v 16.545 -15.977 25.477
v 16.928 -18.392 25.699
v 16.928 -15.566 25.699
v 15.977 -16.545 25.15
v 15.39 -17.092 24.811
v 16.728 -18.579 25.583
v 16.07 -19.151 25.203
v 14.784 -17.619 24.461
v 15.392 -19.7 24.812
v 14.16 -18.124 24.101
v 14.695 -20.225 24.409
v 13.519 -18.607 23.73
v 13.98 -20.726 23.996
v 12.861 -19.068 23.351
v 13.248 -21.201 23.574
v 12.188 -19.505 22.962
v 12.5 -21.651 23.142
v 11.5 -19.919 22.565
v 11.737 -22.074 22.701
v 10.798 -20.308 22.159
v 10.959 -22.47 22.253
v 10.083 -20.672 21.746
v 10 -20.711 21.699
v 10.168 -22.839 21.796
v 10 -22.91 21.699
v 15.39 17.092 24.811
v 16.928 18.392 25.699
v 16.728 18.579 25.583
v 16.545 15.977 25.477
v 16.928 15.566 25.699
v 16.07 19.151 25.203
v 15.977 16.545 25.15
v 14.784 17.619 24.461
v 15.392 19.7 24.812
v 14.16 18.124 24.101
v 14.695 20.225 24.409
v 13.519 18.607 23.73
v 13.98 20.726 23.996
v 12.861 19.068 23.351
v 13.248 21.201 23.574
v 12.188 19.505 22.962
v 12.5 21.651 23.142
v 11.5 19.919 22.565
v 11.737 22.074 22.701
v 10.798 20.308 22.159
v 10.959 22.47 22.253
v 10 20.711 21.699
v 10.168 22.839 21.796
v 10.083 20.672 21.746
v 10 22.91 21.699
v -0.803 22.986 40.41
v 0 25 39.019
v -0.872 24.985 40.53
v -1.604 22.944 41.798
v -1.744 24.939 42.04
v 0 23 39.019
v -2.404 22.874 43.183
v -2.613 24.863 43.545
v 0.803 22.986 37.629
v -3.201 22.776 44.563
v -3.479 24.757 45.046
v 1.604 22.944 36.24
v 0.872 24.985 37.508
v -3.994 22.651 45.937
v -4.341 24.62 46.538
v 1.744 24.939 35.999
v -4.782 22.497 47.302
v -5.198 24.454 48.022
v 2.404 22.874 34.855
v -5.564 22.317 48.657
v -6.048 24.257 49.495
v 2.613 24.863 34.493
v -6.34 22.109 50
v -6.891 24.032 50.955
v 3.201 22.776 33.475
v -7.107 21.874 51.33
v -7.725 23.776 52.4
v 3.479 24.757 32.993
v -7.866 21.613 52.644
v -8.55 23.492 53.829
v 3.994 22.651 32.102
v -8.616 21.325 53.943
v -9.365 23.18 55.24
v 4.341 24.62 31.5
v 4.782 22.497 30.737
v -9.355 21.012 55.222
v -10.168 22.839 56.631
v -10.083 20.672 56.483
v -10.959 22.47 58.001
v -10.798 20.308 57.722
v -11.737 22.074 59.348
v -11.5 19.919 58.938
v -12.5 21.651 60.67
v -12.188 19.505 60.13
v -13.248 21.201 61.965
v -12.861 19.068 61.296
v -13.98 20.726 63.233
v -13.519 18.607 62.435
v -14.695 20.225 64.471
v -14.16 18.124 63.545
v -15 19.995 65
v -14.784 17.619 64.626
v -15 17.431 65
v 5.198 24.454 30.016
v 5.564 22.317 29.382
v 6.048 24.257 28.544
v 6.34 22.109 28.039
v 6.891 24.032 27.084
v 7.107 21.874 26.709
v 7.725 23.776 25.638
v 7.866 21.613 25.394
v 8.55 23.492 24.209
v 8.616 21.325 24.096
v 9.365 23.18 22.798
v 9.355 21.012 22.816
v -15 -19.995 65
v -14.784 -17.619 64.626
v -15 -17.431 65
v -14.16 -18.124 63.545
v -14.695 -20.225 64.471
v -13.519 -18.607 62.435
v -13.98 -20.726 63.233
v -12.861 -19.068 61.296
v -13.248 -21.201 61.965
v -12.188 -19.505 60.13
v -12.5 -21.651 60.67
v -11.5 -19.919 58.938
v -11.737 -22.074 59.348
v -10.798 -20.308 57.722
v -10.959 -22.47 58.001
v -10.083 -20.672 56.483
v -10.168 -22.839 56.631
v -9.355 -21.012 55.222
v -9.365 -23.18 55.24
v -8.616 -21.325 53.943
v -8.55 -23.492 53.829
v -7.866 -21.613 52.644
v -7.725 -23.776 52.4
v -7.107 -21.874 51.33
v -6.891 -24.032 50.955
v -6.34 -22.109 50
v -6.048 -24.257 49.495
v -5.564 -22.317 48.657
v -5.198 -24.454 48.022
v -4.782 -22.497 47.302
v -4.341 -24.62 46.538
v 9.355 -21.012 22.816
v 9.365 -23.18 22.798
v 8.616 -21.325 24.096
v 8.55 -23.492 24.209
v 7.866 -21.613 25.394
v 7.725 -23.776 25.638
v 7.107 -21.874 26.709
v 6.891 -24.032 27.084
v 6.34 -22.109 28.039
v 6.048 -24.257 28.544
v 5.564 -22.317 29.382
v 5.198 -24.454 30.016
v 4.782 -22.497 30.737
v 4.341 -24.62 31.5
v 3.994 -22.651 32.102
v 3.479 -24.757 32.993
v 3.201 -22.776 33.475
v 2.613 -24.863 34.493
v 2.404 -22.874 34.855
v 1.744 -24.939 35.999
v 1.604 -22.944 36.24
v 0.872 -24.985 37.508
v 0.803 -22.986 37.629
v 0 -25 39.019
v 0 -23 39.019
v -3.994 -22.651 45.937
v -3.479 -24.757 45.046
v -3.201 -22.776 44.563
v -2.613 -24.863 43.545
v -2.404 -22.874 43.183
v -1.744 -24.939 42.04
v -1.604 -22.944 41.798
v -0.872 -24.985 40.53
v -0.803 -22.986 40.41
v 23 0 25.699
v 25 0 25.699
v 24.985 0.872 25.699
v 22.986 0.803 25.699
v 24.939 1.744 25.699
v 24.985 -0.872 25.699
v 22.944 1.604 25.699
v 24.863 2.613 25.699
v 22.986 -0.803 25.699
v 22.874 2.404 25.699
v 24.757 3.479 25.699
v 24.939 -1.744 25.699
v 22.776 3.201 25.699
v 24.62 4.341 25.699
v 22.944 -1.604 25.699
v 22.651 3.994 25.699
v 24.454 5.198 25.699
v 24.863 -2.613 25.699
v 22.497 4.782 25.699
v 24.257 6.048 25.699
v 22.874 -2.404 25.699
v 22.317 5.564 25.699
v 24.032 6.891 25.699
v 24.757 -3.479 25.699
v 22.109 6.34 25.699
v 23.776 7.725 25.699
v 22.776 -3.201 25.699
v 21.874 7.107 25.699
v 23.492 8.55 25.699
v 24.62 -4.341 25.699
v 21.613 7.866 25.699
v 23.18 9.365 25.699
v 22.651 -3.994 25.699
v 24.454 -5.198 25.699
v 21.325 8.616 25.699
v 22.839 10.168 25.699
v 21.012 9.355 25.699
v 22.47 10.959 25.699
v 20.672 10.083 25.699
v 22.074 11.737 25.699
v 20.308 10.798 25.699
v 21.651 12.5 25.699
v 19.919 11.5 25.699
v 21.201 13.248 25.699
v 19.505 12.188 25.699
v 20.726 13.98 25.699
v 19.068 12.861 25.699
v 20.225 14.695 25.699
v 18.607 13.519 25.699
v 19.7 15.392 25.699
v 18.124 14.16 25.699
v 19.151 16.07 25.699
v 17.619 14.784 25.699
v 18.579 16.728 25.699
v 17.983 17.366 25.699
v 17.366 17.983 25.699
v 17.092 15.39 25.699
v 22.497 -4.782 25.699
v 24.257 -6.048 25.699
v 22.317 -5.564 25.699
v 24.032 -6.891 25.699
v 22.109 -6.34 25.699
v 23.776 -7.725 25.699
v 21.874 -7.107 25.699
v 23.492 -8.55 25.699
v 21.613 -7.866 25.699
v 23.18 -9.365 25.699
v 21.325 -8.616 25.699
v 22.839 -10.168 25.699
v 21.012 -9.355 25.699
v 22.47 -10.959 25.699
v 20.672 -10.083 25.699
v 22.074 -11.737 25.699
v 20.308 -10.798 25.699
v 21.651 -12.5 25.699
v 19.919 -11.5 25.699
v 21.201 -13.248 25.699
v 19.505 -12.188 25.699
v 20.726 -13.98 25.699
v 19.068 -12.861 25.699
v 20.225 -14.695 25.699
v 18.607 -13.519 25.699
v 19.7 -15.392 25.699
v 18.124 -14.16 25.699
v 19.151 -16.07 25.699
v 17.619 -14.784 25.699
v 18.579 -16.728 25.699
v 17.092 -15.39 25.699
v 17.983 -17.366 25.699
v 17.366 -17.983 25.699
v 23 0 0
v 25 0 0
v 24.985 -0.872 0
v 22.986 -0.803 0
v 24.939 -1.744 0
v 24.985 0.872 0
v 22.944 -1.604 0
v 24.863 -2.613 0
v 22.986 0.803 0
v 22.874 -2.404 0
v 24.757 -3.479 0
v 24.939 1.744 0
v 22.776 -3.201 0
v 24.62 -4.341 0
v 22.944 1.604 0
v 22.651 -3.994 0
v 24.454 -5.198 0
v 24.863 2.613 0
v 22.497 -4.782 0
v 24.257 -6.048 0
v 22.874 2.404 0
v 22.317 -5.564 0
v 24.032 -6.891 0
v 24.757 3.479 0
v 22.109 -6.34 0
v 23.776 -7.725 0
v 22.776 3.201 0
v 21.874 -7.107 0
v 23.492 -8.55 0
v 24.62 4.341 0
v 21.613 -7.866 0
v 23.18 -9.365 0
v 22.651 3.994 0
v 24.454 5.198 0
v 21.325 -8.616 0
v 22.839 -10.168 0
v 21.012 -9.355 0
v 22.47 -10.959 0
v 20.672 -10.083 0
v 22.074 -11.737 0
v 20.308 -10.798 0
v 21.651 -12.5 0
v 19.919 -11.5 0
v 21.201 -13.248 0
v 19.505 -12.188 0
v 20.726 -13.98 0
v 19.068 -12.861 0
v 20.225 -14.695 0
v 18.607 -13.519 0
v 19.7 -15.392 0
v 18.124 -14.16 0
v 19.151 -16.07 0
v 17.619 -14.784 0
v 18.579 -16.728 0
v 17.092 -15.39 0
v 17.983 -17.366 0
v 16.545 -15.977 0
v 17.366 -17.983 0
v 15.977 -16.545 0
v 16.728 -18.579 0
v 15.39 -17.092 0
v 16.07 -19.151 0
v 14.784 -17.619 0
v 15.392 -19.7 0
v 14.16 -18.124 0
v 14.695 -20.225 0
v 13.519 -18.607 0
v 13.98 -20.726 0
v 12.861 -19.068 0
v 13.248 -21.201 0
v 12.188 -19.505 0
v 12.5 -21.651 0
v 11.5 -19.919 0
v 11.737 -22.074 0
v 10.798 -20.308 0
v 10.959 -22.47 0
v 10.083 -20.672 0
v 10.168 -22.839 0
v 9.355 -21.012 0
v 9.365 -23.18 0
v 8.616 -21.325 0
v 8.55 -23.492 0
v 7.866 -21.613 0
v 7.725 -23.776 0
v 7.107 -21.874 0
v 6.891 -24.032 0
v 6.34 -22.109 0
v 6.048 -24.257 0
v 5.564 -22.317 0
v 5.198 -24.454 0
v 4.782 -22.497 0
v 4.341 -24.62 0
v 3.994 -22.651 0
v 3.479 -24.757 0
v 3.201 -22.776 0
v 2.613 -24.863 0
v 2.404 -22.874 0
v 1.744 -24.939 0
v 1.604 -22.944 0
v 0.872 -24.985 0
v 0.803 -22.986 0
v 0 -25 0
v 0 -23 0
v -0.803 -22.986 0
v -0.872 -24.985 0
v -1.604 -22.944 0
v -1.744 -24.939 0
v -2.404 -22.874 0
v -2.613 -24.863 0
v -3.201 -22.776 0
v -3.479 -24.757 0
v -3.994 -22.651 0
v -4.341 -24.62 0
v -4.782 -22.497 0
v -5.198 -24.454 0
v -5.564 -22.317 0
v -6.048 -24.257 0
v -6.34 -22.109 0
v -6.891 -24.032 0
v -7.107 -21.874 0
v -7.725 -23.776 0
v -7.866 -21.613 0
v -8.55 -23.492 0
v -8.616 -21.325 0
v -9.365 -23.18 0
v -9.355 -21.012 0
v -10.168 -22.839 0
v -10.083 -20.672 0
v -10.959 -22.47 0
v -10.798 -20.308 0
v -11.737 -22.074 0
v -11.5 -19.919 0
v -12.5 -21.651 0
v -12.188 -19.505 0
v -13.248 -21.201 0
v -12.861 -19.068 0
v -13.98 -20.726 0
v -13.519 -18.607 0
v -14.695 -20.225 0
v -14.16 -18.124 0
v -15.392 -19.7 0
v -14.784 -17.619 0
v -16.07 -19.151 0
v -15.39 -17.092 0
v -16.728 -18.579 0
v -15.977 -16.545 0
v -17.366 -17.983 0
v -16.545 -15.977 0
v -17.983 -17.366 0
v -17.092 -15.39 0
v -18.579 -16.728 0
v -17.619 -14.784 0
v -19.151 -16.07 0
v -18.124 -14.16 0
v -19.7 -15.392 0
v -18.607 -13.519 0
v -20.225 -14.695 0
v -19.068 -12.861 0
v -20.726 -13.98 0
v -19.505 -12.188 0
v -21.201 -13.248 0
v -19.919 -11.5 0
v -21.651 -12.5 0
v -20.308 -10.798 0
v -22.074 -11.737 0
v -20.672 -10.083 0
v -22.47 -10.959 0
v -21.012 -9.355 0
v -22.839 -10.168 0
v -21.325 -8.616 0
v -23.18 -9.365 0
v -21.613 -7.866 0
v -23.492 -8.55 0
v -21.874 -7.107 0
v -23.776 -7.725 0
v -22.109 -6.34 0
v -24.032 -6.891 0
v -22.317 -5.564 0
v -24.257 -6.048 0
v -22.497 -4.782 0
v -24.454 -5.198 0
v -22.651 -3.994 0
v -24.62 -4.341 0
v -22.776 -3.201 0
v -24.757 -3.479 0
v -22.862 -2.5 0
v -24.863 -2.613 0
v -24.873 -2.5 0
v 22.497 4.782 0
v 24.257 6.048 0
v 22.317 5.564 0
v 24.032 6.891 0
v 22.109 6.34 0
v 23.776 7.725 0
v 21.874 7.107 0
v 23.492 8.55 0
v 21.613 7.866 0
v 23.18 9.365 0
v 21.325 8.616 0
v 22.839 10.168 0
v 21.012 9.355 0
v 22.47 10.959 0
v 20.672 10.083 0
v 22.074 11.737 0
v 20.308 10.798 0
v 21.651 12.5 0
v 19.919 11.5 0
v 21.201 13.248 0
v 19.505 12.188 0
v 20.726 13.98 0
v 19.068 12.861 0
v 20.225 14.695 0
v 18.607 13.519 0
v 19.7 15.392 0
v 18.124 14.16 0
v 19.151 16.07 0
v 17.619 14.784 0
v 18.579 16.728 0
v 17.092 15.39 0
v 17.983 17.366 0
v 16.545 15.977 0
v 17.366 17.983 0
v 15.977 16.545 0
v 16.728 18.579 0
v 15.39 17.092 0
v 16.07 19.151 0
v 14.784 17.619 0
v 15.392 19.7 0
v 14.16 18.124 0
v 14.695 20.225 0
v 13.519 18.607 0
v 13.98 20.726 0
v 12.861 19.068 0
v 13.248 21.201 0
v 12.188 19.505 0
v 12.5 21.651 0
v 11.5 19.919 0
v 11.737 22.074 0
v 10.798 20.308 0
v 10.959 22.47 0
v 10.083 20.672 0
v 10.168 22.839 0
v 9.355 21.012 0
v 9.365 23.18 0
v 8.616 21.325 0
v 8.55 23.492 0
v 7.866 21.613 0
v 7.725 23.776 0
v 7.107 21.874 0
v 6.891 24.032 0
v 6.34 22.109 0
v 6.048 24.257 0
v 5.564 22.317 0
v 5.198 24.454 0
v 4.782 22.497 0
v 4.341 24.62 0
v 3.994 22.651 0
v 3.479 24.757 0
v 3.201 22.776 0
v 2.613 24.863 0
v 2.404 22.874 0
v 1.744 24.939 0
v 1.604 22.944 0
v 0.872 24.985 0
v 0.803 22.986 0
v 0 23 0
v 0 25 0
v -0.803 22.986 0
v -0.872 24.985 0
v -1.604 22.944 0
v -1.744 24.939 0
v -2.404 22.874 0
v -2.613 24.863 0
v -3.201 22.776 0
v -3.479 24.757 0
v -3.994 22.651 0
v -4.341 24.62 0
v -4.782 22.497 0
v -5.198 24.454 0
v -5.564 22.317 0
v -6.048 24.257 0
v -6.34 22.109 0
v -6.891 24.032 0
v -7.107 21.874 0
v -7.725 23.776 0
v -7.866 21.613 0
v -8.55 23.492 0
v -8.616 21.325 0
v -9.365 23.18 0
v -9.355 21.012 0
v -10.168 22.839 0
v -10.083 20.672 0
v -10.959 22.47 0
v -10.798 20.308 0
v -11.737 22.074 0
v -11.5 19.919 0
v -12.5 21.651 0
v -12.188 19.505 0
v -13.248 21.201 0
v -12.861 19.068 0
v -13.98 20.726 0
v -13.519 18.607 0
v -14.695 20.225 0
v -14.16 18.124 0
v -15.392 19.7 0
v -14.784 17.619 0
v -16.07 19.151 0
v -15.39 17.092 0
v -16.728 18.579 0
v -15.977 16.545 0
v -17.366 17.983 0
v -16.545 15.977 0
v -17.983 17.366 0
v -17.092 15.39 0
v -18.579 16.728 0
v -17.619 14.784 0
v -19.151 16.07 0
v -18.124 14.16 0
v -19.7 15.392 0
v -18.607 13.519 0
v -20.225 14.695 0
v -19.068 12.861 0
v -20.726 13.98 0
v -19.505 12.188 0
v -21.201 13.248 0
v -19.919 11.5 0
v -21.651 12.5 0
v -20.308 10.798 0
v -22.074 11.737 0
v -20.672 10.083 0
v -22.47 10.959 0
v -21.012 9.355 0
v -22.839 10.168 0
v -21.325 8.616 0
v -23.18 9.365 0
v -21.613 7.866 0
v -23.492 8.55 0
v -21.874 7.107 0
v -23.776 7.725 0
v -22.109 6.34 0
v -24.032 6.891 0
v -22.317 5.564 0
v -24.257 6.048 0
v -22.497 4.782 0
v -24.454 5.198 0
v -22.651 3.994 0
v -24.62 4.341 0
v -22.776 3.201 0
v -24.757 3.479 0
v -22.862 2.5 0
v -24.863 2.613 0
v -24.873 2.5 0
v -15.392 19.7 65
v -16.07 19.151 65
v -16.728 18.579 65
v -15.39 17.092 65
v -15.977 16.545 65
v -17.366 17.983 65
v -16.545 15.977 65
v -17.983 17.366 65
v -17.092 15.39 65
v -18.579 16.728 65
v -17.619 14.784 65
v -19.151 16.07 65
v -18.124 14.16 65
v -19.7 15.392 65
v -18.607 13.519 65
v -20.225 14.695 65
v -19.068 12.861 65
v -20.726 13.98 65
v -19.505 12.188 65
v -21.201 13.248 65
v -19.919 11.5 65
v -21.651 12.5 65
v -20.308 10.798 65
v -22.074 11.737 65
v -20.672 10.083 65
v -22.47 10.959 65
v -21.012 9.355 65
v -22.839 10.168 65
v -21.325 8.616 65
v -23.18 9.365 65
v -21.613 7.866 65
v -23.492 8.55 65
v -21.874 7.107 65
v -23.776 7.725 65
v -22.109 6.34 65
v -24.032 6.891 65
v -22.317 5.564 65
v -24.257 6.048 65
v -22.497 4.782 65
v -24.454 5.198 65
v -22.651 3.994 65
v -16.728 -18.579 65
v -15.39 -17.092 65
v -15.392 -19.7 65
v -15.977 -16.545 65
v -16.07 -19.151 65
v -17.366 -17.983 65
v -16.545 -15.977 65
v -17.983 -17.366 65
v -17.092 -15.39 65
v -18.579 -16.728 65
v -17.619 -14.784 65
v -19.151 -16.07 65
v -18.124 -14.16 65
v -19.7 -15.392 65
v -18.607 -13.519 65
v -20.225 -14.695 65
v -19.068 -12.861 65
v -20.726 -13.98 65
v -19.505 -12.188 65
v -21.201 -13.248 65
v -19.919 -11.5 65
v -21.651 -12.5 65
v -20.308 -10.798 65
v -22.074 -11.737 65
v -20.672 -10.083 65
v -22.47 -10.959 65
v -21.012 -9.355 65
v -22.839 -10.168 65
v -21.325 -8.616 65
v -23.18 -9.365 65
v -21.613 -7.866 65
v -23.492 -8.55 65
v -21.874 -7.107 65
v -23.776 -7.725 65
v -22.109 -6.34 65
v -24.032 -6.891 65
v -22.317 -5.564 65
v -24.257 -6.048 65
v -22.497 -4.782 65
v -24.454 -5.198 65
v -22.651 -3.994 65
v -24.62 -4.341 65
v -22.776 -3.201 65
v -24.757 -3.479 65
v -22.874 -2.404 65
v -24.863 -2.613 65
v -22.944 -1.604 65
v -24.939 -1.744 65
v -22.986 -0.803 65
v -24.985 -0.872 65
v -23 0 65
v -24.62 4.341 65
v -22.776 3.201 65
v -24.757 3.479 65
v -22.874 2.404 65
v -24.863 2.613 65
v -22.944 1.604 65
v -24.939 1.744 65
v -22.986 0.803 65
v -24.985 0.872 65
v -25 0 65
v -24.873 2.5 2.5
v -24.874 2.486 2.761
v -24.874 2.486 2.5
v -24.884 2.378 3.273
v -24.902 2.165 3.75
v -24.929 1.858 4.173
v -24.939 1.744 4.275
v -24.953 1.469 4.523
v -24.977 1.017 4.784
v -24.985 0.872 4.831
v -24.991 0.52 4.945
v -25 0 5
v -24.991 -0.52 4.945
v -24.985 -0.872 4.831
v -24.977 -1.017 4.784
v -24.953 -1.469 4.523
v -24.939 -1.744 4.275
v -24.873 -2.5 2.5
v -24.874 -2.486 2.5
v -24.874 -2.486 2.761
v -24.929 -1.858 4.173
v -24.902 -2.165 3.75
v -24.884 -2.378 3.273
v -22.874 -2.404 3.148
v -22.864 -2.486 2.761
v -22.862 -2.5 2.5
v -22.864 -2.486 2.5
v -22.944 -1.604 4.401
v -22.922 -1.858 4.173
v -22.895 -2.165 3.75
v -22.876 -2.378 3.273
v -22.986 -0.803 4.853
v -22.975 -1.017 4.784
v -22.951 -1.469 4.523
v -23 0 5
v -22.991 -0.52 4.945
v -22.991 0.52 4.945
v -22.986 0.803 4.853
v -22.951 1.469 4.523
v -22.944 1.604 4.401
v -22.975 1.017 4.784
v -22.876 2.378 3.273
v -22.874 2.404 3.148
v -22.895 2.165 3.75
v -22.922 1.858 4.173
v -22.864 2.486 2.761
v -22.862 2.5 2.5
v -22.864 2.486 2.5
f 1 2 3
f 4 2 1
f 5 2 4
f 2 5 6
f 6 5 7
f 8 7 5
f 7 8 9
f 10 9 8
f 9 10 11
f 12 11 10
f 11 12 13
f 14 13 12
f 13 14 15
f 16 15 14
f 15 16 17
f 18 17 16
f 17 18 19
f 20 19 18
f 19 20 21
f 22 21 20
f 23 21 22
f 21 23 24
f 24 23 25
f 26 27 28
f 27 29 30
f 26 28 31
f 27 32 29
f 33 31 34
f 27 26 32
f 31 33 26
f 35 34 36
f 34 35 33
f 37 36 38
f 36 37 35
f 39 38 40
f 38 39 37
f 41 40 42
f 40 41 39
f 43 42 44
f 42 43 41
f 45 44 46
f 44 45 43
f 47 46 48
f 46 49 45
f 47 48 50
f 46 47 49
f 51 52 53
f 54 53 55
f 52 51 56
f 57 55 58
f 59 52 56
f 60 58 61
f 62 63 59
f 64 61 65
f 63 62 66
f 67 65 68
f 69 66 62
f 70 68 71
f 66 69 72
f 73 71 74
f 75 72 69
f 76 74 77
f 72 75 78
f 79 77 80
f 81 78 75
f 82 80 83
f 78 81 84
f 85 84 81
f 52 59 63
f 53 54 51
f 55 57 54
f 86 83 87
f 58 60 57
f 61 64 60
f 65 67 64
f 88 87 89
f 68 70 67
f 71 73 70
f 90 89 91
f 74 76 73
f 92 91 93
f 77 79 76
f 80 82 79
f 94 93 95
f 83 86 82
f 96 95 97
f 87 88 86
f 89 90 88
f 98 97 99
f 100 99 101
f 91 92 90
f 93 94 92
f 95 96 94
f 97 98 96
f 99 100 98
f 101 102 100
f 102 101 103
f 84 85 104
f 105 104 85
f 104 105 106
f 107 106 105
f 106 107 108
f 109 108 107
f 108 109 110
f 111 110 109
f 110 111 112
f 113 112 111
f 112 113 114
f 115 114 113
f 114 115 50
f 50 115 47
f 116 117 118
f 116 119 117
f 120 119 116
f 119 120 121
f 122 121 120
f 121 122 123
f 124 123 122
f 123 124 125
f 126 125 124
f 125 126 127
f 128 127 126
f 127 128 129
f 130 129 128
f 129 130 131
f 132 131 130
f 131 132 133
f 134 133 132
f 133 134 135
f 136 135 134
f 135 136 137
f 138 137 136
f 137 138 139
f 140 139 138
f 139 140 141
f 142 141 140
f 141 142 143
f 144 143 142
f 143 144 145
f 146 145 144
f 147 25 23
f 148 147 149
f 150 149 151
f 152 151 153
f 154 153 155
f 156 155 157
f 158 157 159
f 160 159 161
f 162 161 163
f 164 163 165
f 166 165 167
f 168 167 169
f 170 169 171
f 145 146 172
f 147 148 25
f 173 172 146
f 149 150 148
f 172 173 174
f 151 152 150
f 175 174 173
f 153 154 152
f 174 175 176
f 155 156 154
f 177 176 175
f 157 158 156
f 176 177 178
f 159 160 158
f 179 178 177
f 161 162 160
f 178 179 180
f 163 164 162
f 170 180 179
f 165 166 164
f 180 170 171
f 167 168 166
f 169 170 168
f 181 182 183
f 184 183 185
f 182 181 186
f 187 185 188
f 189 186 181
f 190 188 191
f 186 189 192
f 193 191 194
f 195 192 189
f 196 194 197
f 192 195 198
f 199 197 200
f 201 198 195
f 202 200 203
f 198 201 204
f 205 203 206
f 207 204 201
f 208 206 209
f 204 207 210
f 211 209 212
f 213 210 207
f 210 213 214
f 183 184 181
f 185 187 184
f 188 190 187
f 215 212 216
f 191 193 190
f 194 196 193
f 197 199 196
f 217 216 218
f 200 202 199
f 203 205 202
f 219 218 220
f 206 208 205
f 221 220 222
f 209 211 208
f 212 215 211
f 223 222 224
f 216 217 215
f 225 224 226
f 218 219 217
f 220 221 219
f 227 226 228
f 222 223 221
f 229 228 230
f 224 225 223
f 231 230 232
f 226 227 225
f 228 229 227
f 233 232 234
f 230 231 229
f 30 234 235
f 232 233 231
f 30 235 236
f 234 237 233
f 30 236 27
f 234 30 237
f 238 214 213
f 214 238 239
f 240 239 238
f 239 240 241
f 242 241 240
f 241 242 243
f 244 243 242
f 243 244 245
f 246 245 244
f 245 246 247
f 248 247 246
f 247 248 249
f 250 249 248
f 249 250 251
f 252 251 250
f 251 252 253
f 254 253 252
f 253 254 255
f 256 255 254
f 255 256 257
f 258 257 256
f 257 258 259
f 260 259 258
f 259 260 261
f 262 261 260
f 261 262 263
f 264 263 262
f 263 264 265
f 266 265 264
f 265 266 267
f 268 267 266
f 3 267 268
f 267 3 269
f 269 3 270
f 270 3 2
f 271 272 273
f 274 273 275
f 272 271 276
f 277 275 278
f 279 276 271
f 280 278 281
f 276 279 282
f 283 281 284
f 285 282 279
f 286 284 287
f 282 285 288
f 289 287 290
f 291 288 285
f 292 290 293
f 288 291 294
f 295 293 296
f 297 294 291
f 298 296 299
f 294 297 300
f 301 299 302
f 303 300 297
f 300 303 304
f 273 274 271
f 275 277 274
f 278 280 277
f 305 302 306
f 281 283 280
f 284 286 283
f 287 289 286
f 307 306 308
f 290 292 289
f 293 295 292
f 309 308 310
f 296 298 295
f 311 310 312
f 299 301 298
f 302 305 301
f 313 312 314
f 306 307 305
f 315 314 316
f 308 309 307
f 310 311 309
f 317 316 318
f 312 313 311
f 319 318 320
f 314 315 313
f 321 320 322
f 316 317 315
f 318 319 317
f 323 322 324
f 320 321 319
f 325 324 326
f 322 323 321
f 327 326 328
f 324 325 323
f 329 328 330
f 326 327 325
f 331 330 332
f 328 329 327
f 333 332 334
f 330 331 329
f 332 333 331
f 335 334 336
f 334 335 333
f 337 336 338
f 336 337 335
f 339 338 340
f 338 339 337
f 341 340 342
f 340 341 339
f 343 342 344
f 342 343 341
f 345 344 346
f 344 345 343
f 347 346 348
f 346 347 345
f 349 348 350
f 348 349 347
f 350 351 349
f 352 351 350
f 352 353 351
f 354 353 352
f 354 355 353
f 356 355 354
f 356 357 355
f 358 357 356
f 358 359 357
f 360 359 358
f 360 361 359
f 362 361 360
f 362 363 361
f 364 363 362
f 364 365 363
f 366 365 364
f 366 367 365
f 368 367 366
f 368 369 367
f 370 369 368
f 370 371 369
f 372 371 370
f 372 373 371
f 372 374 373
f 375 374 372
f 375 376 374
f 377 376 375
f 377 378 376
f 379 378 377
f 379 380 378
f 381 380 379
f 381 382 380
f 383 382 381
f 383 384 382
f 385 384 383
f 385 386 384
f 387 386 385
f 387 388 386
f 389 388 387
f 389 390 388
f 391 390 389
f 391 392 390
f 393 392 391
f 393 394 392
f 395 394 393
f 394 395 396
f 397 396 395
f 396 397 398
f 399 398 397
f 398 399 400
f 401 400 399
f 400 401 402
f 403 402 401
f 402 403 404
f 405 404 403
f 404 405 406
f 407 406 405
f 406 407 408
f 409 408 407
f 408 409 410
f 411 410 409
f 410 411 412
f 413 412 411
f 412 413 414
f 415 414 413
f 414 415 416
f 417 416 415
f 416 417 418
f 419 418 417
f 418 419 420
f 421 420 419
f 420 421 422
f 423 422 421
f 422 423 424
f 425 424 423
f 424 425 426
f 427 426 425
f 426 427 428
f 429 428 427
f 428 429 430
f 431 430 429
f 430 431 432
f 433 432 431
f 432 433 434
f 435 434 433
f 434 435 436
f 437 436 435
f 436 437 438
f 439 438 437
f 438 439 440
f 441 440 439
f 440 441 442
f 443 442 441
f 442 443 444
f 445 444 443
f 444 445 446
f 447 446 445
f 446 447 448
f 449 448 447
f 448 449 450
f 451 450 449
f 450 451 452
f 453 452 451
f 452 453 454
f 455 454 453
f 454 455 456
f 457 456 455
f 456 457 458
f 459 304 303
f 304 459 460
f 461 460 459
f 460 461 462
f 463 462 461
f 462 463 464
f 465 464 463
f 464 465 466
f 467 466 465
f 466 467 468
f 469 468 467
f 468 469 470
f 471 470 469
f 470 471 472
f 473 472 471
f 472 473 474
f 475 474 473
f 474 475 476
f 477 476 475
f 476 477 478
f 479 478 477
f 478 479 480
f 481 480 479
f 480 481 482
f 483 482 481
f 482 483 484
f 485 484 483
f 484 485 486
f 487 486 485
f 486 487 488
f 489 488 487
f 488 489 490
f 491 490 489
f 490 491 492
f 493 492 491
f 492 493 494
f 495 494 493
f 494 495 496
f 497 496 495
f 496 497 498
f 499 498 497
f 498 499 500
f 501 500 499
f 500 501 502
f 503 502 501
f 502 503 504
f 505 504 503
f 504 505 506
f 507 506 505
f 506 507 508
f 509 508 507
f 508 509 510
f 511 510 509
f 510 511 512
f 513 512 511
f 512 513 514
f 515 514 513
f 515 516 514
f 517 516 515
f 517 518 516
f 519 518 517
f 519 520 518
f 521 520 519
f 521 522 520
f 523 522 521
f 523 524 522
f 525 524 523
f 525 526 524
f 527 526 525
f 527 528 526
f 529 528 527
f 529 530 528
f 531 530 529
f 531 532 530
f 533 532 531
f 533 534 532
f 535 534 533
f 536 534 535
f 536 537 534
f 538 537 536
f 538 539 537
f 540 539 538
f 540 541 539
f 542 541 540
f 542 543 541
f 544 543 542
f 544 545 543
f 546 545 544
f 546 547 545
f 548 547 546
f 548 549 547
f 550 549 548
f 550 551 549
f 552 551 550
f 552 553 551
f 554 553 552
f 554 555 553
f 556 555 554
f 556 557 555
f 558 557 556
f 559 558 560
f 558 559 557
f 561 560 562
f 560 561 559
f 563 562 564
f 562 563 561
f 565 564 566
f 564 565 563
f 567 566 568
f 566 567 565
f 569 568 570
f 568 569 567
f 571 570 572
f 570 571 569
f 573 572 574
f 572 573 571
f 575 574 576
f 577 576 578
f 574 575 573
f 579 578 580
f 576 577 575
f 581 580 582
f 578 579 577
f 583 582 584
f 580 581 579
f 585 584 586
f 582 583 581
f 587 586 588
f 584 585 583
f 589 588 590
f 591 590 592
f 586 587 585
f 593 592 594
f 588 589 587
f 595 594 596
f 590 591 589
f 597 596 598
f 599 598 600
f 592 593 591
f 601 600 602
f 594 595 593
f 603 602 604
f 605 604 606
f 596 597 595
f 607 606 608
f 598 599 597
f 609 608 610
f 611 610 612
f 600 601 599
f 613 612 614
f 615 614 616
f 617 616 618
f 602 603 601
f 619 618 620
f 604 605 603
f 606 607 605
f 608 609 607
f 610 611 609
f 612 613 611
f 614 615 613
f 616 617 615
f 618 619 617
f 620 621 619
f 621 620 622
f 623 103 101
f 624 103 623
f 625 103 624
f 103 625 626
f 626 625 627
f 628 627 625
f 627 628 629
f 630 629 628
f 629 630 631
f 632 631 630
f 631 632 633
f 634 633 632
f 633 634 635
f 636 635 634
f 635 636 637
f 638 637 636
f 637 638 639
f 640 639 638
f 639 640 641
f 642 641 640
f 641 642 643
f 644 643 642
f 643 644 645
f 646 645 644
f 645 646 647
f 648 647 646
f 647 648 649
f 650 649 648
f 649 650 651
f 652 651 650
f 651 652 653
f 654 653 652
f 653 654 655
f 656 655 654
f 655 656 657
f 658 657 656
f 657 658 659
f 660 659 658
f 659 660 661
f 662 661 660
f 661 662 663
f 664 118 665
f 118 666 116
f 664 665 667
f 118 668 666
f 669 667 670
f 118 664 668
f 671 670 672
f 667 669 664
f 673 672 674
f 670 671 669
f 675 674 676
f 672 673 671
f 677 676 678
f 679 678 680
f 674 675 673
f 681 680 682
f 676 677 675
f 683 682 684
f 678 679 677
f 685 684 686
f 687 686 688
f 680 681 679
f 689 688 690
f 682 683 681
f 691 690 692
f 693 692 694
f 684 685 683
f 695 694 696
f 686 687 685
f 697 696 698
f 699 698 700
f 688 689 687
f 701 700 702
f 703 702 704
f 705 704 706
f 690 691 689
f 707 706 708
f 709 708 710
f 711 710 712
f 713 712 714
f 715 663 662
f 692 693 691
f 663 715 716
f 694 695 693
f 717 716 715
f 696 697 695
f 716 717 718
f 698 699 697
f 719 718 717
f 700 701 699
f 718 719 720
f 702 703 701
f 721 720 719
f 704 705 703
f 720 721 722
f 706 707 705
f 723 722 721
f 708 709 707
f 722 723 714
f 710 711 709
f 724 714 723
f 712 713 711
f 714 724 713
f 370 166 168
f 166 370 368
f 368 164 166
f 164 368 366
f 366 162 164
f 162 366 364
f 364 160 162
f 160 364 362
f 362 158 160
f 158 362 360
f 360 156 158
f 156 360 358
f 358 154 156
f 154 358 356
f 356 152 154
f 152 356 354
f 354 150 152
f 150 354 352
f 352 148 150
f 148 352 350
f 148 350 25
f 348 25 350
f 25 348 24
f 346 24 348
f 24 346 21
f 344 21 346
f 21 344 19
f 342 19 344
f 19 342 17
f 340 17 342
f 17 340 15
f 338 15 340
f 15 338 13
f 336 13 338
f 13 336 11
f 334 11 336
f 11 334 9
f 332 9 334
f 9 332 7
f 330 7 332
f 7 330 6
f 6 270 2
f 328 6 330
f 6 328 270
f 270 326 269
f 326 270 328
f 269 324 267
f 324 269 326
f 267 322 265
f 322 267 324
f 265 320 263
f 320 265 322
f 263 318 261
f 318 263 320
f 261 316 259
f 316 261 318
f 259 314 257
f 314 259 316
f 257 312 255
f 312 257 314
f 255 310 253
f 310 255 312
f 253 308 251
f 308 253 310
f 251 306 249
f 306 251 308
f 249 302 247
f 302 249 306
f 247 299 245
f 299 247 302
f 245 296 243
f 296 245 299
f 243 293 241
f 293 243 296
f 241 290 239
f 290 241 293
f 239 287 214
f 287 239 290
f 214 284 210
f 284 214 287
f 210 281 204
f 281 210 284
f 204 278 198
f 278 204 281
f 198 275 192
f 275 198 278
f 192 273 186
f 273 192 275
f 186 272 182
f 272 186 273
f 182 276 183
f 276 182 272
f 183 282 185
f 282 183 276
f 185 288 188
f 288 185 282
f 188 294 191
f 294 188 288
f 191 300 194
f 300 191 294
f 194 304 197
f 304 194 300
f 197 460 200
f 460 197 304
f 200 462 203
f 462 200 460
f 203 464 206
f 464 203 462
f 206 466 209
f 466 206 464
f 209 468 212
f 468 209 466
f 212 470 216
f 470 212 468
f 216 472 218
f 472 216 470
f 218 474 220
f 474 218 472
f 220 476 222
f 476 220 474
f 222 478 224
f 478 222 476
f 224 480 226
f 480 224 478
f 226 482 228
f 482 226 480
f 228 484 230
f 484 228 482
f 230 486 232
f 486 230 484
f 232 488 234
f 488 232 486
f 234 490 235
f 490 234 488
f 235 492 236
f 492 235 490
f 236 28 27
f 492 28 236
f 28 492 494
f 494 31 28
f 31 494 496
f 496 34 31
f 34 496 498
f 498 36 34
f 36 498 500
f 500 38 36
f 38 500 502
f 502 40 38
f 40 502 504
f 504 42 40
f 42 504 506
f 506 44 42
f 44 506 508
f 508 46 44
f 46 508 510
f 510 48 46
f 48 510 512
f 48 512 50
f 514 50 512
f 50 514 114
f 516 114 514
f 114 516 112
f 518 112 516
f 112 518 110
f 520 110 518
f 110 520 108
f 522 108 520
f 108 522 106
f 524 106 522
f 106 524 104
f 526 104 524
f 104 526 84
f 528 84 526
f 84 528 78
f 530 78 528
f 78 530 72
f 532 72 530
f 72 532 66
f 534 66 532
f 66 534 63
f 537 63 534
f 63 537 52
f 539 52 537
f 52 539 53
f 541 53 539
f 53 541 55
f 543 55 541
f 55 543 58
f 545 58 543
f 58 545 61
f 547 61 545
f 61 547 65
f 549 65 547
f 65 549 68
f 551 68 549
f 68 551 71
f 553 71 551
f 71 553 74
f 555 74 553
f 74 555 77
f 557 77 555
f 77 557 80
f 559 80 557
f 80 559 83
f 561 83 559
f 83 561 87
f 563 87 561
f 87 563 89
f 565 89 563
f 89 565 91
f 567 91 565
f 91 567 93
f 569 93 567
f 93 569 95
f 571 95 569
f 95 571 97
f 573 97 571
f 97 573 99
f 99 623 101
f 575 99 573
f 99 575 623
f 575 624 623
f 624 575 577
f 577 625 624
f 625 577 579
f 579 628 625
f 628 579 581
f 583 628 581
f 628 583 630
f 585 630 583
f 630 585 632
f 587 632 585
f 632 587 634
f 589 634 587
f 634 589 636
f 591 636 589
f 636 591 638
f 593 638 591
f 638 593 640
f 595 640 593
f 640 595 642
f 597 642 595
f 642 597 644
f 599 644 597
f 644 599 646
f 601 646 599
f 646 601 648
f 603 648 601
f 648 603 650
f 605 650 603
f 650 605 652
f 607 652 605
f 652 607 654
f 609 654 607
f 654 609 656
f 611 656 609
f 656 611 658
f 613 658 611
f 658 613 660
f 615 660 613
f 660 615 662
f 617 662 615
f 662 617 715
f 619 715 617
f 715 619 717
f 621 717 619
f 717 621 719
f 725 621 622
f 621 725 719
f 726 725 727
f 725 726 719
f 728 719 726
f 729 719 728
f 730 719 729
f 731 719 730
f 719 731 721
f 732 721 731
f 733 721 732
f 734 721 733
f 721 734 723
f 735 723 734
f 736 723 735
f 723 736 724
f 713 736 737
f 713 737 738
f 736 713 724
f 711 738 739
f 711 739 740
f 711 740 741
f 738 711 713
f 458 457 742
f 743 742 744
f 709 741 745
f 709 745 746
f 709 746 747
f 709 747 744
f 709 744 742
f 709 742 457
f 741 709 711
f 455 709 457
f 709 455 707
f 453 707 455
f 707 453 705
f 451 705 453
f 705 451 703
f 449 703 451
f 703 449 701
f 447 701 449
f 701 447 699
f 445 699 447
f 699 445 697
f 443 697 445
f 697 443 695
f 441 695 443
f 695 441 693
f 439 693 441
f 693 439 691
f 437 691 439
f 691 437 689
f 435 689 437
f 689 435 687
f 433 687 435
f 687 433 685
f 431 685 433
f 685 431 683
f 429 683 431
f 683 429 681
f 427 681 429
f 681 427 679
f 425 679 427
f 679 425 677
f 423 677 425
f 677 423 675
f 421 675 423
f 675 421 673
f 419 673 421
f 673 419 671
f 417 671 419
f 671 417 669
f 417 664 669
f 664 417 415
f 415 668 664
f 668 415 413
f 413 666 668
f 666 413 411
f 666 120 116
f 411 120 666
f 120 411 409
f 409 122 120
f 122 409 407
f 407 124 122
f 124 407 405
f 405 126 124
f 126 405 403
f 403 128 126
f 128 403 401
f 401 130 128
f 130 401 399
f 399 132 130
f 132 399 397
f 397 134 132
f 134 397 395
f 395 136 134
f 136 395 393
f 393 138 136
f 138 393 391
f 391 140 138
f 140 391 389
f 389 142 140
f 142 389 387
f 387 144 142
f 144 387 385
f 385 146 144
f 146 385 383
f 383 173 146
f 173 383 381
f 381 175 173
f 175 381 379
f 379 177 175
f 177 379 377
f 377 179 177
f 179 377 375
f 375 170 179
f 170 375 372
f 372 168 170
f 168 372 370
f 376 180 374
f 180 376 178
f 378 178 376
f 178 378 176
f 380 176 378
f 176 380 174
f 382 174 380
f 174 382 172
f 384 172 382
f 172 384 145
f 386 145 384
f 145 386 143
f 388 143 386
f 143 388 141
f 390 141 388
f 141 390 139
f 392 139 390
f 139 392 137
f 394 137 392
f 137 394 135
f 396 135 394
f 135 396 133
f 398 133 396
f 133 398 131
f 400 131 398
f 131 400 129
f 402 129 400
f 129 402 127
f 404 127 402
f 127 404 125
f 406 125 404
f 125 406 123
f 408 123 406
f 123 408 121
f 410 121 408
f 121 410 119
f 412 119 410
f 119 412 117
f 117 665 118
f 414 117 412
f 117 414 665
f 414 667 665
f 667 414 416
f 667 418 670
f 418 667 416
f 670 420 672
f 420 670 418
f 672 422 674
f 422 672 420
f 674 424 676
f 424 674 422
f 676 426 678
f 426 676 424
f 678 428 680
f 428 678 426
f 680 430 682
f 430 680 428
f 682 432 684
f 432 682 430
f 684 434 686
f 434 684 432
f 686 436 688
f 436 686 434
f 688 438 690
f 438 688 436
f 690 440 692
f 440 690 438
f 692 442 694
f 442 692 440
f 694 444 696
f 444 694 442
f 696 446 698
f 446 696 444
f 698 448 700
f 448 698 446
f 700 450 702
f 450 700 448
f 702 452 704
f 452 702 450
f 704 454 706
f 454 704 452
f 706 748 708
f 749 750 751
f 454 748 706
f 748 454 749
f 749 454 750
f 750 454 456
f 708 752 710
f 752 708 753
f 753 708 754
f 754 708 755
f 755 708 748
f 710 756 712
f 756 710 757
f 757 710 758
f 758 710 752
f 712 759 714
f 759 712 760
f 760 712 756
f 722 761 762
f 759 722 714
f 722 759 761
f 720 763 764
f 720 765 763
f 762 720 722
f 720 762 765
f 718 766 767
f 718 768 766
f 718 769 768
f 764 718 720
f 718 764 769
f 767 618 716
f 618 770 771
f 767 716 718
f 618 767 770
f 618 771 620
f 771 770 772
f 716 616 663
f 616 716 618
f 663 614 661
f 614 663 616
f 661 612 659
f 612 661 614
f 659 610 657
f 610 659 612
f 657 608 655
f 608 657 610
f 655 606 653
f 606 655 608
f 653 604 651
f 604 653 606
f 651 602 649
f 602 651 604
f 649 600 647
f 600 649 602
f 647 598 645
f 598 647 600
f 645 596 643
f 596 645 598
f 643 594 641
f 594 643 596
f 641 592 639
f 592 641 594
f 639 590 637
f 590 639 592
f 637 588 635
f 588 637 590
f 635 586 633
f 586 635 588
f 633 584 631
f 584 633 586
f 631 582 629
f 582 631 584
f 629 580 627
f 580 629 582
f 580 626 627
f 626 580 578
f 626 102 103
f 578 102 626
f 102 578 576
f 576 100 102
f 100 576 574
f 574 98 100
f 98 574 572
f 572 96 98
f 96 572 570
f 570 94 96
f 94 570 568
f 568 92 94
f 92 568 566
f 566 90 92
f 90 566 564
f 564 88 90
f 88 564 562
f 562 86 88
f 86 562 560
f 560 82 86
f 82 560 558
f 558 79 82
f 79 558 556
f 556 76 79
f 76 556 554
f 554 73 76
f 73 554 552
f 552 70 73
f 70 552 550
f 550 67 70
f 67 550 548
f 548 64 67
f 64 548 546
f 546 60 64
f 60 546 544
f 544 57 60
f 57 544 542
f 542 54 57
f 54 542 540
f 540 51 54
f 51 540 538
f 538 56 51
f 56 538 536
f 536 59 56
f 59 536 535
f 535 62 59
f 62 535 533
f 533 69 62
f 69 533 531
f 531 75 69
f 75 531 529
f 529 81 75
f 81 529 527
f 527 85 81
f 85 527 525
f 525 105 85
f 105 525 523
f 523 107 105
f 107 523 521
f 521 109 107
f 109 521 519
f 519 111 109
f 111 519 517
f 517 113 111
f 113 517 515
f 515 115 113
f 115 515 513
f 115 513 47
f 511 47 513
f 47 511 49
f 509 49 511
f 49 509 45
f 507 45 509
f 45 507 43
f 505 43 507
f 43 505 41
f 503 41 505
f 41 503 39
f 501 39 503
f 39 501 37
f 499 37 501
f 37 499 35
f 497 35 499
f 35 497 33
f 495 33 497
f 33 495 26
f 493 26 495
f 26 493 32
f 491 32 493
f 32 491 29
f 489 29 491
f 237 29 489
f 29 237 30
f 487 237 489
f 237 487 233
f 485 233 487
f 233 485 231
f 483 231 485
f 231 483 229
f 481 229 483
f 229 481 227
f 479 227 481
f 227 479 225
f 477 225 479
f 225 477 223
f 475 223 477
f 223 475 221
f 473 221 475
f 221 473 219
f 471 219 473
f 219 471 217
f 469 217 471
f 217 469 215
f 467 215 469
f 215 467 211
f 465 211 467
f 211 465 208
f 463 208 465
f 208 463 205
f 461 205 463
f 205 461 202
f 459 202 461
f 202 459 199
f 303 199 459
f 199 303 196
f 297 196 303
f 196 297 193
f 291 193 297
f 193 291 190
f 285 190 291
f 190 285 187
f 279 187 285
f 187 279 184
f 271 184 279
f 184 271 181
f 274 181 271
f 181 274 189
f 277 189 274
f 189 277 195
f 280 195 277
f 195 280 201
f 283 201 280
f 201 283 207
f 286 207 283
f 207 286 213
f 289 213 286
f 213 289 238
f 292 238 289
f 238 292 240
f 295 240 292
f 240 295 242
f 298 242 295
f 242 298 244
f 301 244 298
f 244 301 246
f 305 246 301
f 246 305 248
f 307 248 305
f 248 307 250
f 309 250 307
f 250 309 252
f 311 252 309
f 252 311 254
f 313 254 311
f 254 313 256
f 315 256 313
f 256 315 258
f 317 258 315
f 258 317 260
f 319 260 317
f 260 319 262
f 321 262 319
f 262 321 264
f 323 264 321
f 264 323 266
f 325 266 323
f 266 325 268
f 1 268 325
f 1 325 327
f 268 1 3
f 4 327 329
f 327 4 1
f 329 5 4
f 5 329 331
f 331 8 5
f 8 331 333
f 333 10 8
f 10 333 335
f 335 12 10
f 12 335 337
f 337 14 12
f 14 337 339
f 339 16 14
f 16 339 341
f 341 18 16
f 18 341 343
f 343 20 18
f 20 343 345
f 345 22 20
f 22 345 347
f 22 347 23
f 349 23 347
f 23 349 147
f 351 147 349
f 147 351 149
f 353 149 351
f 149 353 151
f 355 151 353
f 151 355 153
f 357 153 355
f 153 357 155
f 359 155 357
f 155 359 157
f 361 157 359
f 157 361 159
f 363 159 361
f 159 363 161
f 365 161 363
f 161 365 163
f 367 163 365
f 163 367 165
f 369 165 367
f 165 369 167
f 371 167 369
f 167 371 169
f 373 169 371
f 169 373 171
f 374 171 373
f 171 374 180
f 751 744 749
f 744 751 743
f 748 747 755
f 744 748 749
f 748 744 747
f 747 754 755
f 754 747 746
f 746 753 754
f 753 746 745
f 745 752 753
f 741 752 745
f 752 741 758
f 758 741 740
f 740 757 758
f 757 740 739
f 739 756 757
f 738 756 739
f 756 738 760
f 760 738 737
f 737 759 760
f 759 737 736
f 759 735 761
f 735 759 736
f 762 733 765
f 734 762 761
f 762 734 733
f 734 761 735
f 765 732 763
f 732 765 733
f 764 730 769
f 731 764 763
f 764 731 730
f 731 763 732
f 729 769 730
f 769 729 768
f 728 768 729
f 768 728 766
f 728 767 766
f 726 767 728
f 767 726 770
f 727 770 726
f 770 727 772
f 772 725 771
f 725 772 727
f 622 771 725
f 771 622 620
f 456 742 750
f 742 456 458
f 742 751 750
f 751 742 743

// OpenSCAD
/* [Main] */
// in mm
stand_height = 65; // [50:5:100]
// in mm
stand_diameter = 50; // [30:5:50]
// in mm
stand_thickness = 2; // [2:0.5:5]
// in degrees
stand_angle = 30; // [20:5:50]
// in mm
stand_lip_depth = 8; // [5:1:15]
// in mm
front_lip_offset = 10; // [0:1:20]
// in mm
cable_hole_width = 5; // [3:1:10]

main();

module main()
{
    render(convexity = 1)
    difference() {
        tube();
        moved_cutout();
        cable_hole();
    }
}

module tube()
{
    linear_extrude(stand_height)
    difference() {
        circle(r=stand_diameter*0.5, $fn=180);
        circle(r=(stand_diameter*0.5)-stand_thickness, $fn=180);
    }
}

module moved_cutout()
{
    translate([front_lip_offset-(stand_diameter*0.5), 0, stand_height])
    rotate([0, -stand_angle, 0])
    translate([stand_diameter*0.5, 0, -stand_diameter])
    cutout();
}

module cutout()
{
    cube();
    lip();
}

module cube()
{
    linear_extrude(stand_diameter)
        square(size=stand_diameter, center=true);
}

module lip()
{
    translate([stand_lip_depth-(stand_diameter*0.5), 0, 0])
    rotate([0, stand_angle, 0])
    translate([stand_diameter*0.5, 0, 0])
    cube();
}

module cable_hole()
{
    translate([-stand_thickness, 0, 0])
    rotate([0, -90, 0])
    translate([0, 0, -stand_thickness])
    linear_extrude(stand_diameter*0.5)
    union() {
        translate([0, -cable_hole_width*0.5, 0])
            square(size=[cable_hole_width*0.5, cable_hole_width]);
        translate([cable_hole_width*0.5, 0, 0])
        circle(r=cable_hole_width*0.5, $fn=30);
    }
}
